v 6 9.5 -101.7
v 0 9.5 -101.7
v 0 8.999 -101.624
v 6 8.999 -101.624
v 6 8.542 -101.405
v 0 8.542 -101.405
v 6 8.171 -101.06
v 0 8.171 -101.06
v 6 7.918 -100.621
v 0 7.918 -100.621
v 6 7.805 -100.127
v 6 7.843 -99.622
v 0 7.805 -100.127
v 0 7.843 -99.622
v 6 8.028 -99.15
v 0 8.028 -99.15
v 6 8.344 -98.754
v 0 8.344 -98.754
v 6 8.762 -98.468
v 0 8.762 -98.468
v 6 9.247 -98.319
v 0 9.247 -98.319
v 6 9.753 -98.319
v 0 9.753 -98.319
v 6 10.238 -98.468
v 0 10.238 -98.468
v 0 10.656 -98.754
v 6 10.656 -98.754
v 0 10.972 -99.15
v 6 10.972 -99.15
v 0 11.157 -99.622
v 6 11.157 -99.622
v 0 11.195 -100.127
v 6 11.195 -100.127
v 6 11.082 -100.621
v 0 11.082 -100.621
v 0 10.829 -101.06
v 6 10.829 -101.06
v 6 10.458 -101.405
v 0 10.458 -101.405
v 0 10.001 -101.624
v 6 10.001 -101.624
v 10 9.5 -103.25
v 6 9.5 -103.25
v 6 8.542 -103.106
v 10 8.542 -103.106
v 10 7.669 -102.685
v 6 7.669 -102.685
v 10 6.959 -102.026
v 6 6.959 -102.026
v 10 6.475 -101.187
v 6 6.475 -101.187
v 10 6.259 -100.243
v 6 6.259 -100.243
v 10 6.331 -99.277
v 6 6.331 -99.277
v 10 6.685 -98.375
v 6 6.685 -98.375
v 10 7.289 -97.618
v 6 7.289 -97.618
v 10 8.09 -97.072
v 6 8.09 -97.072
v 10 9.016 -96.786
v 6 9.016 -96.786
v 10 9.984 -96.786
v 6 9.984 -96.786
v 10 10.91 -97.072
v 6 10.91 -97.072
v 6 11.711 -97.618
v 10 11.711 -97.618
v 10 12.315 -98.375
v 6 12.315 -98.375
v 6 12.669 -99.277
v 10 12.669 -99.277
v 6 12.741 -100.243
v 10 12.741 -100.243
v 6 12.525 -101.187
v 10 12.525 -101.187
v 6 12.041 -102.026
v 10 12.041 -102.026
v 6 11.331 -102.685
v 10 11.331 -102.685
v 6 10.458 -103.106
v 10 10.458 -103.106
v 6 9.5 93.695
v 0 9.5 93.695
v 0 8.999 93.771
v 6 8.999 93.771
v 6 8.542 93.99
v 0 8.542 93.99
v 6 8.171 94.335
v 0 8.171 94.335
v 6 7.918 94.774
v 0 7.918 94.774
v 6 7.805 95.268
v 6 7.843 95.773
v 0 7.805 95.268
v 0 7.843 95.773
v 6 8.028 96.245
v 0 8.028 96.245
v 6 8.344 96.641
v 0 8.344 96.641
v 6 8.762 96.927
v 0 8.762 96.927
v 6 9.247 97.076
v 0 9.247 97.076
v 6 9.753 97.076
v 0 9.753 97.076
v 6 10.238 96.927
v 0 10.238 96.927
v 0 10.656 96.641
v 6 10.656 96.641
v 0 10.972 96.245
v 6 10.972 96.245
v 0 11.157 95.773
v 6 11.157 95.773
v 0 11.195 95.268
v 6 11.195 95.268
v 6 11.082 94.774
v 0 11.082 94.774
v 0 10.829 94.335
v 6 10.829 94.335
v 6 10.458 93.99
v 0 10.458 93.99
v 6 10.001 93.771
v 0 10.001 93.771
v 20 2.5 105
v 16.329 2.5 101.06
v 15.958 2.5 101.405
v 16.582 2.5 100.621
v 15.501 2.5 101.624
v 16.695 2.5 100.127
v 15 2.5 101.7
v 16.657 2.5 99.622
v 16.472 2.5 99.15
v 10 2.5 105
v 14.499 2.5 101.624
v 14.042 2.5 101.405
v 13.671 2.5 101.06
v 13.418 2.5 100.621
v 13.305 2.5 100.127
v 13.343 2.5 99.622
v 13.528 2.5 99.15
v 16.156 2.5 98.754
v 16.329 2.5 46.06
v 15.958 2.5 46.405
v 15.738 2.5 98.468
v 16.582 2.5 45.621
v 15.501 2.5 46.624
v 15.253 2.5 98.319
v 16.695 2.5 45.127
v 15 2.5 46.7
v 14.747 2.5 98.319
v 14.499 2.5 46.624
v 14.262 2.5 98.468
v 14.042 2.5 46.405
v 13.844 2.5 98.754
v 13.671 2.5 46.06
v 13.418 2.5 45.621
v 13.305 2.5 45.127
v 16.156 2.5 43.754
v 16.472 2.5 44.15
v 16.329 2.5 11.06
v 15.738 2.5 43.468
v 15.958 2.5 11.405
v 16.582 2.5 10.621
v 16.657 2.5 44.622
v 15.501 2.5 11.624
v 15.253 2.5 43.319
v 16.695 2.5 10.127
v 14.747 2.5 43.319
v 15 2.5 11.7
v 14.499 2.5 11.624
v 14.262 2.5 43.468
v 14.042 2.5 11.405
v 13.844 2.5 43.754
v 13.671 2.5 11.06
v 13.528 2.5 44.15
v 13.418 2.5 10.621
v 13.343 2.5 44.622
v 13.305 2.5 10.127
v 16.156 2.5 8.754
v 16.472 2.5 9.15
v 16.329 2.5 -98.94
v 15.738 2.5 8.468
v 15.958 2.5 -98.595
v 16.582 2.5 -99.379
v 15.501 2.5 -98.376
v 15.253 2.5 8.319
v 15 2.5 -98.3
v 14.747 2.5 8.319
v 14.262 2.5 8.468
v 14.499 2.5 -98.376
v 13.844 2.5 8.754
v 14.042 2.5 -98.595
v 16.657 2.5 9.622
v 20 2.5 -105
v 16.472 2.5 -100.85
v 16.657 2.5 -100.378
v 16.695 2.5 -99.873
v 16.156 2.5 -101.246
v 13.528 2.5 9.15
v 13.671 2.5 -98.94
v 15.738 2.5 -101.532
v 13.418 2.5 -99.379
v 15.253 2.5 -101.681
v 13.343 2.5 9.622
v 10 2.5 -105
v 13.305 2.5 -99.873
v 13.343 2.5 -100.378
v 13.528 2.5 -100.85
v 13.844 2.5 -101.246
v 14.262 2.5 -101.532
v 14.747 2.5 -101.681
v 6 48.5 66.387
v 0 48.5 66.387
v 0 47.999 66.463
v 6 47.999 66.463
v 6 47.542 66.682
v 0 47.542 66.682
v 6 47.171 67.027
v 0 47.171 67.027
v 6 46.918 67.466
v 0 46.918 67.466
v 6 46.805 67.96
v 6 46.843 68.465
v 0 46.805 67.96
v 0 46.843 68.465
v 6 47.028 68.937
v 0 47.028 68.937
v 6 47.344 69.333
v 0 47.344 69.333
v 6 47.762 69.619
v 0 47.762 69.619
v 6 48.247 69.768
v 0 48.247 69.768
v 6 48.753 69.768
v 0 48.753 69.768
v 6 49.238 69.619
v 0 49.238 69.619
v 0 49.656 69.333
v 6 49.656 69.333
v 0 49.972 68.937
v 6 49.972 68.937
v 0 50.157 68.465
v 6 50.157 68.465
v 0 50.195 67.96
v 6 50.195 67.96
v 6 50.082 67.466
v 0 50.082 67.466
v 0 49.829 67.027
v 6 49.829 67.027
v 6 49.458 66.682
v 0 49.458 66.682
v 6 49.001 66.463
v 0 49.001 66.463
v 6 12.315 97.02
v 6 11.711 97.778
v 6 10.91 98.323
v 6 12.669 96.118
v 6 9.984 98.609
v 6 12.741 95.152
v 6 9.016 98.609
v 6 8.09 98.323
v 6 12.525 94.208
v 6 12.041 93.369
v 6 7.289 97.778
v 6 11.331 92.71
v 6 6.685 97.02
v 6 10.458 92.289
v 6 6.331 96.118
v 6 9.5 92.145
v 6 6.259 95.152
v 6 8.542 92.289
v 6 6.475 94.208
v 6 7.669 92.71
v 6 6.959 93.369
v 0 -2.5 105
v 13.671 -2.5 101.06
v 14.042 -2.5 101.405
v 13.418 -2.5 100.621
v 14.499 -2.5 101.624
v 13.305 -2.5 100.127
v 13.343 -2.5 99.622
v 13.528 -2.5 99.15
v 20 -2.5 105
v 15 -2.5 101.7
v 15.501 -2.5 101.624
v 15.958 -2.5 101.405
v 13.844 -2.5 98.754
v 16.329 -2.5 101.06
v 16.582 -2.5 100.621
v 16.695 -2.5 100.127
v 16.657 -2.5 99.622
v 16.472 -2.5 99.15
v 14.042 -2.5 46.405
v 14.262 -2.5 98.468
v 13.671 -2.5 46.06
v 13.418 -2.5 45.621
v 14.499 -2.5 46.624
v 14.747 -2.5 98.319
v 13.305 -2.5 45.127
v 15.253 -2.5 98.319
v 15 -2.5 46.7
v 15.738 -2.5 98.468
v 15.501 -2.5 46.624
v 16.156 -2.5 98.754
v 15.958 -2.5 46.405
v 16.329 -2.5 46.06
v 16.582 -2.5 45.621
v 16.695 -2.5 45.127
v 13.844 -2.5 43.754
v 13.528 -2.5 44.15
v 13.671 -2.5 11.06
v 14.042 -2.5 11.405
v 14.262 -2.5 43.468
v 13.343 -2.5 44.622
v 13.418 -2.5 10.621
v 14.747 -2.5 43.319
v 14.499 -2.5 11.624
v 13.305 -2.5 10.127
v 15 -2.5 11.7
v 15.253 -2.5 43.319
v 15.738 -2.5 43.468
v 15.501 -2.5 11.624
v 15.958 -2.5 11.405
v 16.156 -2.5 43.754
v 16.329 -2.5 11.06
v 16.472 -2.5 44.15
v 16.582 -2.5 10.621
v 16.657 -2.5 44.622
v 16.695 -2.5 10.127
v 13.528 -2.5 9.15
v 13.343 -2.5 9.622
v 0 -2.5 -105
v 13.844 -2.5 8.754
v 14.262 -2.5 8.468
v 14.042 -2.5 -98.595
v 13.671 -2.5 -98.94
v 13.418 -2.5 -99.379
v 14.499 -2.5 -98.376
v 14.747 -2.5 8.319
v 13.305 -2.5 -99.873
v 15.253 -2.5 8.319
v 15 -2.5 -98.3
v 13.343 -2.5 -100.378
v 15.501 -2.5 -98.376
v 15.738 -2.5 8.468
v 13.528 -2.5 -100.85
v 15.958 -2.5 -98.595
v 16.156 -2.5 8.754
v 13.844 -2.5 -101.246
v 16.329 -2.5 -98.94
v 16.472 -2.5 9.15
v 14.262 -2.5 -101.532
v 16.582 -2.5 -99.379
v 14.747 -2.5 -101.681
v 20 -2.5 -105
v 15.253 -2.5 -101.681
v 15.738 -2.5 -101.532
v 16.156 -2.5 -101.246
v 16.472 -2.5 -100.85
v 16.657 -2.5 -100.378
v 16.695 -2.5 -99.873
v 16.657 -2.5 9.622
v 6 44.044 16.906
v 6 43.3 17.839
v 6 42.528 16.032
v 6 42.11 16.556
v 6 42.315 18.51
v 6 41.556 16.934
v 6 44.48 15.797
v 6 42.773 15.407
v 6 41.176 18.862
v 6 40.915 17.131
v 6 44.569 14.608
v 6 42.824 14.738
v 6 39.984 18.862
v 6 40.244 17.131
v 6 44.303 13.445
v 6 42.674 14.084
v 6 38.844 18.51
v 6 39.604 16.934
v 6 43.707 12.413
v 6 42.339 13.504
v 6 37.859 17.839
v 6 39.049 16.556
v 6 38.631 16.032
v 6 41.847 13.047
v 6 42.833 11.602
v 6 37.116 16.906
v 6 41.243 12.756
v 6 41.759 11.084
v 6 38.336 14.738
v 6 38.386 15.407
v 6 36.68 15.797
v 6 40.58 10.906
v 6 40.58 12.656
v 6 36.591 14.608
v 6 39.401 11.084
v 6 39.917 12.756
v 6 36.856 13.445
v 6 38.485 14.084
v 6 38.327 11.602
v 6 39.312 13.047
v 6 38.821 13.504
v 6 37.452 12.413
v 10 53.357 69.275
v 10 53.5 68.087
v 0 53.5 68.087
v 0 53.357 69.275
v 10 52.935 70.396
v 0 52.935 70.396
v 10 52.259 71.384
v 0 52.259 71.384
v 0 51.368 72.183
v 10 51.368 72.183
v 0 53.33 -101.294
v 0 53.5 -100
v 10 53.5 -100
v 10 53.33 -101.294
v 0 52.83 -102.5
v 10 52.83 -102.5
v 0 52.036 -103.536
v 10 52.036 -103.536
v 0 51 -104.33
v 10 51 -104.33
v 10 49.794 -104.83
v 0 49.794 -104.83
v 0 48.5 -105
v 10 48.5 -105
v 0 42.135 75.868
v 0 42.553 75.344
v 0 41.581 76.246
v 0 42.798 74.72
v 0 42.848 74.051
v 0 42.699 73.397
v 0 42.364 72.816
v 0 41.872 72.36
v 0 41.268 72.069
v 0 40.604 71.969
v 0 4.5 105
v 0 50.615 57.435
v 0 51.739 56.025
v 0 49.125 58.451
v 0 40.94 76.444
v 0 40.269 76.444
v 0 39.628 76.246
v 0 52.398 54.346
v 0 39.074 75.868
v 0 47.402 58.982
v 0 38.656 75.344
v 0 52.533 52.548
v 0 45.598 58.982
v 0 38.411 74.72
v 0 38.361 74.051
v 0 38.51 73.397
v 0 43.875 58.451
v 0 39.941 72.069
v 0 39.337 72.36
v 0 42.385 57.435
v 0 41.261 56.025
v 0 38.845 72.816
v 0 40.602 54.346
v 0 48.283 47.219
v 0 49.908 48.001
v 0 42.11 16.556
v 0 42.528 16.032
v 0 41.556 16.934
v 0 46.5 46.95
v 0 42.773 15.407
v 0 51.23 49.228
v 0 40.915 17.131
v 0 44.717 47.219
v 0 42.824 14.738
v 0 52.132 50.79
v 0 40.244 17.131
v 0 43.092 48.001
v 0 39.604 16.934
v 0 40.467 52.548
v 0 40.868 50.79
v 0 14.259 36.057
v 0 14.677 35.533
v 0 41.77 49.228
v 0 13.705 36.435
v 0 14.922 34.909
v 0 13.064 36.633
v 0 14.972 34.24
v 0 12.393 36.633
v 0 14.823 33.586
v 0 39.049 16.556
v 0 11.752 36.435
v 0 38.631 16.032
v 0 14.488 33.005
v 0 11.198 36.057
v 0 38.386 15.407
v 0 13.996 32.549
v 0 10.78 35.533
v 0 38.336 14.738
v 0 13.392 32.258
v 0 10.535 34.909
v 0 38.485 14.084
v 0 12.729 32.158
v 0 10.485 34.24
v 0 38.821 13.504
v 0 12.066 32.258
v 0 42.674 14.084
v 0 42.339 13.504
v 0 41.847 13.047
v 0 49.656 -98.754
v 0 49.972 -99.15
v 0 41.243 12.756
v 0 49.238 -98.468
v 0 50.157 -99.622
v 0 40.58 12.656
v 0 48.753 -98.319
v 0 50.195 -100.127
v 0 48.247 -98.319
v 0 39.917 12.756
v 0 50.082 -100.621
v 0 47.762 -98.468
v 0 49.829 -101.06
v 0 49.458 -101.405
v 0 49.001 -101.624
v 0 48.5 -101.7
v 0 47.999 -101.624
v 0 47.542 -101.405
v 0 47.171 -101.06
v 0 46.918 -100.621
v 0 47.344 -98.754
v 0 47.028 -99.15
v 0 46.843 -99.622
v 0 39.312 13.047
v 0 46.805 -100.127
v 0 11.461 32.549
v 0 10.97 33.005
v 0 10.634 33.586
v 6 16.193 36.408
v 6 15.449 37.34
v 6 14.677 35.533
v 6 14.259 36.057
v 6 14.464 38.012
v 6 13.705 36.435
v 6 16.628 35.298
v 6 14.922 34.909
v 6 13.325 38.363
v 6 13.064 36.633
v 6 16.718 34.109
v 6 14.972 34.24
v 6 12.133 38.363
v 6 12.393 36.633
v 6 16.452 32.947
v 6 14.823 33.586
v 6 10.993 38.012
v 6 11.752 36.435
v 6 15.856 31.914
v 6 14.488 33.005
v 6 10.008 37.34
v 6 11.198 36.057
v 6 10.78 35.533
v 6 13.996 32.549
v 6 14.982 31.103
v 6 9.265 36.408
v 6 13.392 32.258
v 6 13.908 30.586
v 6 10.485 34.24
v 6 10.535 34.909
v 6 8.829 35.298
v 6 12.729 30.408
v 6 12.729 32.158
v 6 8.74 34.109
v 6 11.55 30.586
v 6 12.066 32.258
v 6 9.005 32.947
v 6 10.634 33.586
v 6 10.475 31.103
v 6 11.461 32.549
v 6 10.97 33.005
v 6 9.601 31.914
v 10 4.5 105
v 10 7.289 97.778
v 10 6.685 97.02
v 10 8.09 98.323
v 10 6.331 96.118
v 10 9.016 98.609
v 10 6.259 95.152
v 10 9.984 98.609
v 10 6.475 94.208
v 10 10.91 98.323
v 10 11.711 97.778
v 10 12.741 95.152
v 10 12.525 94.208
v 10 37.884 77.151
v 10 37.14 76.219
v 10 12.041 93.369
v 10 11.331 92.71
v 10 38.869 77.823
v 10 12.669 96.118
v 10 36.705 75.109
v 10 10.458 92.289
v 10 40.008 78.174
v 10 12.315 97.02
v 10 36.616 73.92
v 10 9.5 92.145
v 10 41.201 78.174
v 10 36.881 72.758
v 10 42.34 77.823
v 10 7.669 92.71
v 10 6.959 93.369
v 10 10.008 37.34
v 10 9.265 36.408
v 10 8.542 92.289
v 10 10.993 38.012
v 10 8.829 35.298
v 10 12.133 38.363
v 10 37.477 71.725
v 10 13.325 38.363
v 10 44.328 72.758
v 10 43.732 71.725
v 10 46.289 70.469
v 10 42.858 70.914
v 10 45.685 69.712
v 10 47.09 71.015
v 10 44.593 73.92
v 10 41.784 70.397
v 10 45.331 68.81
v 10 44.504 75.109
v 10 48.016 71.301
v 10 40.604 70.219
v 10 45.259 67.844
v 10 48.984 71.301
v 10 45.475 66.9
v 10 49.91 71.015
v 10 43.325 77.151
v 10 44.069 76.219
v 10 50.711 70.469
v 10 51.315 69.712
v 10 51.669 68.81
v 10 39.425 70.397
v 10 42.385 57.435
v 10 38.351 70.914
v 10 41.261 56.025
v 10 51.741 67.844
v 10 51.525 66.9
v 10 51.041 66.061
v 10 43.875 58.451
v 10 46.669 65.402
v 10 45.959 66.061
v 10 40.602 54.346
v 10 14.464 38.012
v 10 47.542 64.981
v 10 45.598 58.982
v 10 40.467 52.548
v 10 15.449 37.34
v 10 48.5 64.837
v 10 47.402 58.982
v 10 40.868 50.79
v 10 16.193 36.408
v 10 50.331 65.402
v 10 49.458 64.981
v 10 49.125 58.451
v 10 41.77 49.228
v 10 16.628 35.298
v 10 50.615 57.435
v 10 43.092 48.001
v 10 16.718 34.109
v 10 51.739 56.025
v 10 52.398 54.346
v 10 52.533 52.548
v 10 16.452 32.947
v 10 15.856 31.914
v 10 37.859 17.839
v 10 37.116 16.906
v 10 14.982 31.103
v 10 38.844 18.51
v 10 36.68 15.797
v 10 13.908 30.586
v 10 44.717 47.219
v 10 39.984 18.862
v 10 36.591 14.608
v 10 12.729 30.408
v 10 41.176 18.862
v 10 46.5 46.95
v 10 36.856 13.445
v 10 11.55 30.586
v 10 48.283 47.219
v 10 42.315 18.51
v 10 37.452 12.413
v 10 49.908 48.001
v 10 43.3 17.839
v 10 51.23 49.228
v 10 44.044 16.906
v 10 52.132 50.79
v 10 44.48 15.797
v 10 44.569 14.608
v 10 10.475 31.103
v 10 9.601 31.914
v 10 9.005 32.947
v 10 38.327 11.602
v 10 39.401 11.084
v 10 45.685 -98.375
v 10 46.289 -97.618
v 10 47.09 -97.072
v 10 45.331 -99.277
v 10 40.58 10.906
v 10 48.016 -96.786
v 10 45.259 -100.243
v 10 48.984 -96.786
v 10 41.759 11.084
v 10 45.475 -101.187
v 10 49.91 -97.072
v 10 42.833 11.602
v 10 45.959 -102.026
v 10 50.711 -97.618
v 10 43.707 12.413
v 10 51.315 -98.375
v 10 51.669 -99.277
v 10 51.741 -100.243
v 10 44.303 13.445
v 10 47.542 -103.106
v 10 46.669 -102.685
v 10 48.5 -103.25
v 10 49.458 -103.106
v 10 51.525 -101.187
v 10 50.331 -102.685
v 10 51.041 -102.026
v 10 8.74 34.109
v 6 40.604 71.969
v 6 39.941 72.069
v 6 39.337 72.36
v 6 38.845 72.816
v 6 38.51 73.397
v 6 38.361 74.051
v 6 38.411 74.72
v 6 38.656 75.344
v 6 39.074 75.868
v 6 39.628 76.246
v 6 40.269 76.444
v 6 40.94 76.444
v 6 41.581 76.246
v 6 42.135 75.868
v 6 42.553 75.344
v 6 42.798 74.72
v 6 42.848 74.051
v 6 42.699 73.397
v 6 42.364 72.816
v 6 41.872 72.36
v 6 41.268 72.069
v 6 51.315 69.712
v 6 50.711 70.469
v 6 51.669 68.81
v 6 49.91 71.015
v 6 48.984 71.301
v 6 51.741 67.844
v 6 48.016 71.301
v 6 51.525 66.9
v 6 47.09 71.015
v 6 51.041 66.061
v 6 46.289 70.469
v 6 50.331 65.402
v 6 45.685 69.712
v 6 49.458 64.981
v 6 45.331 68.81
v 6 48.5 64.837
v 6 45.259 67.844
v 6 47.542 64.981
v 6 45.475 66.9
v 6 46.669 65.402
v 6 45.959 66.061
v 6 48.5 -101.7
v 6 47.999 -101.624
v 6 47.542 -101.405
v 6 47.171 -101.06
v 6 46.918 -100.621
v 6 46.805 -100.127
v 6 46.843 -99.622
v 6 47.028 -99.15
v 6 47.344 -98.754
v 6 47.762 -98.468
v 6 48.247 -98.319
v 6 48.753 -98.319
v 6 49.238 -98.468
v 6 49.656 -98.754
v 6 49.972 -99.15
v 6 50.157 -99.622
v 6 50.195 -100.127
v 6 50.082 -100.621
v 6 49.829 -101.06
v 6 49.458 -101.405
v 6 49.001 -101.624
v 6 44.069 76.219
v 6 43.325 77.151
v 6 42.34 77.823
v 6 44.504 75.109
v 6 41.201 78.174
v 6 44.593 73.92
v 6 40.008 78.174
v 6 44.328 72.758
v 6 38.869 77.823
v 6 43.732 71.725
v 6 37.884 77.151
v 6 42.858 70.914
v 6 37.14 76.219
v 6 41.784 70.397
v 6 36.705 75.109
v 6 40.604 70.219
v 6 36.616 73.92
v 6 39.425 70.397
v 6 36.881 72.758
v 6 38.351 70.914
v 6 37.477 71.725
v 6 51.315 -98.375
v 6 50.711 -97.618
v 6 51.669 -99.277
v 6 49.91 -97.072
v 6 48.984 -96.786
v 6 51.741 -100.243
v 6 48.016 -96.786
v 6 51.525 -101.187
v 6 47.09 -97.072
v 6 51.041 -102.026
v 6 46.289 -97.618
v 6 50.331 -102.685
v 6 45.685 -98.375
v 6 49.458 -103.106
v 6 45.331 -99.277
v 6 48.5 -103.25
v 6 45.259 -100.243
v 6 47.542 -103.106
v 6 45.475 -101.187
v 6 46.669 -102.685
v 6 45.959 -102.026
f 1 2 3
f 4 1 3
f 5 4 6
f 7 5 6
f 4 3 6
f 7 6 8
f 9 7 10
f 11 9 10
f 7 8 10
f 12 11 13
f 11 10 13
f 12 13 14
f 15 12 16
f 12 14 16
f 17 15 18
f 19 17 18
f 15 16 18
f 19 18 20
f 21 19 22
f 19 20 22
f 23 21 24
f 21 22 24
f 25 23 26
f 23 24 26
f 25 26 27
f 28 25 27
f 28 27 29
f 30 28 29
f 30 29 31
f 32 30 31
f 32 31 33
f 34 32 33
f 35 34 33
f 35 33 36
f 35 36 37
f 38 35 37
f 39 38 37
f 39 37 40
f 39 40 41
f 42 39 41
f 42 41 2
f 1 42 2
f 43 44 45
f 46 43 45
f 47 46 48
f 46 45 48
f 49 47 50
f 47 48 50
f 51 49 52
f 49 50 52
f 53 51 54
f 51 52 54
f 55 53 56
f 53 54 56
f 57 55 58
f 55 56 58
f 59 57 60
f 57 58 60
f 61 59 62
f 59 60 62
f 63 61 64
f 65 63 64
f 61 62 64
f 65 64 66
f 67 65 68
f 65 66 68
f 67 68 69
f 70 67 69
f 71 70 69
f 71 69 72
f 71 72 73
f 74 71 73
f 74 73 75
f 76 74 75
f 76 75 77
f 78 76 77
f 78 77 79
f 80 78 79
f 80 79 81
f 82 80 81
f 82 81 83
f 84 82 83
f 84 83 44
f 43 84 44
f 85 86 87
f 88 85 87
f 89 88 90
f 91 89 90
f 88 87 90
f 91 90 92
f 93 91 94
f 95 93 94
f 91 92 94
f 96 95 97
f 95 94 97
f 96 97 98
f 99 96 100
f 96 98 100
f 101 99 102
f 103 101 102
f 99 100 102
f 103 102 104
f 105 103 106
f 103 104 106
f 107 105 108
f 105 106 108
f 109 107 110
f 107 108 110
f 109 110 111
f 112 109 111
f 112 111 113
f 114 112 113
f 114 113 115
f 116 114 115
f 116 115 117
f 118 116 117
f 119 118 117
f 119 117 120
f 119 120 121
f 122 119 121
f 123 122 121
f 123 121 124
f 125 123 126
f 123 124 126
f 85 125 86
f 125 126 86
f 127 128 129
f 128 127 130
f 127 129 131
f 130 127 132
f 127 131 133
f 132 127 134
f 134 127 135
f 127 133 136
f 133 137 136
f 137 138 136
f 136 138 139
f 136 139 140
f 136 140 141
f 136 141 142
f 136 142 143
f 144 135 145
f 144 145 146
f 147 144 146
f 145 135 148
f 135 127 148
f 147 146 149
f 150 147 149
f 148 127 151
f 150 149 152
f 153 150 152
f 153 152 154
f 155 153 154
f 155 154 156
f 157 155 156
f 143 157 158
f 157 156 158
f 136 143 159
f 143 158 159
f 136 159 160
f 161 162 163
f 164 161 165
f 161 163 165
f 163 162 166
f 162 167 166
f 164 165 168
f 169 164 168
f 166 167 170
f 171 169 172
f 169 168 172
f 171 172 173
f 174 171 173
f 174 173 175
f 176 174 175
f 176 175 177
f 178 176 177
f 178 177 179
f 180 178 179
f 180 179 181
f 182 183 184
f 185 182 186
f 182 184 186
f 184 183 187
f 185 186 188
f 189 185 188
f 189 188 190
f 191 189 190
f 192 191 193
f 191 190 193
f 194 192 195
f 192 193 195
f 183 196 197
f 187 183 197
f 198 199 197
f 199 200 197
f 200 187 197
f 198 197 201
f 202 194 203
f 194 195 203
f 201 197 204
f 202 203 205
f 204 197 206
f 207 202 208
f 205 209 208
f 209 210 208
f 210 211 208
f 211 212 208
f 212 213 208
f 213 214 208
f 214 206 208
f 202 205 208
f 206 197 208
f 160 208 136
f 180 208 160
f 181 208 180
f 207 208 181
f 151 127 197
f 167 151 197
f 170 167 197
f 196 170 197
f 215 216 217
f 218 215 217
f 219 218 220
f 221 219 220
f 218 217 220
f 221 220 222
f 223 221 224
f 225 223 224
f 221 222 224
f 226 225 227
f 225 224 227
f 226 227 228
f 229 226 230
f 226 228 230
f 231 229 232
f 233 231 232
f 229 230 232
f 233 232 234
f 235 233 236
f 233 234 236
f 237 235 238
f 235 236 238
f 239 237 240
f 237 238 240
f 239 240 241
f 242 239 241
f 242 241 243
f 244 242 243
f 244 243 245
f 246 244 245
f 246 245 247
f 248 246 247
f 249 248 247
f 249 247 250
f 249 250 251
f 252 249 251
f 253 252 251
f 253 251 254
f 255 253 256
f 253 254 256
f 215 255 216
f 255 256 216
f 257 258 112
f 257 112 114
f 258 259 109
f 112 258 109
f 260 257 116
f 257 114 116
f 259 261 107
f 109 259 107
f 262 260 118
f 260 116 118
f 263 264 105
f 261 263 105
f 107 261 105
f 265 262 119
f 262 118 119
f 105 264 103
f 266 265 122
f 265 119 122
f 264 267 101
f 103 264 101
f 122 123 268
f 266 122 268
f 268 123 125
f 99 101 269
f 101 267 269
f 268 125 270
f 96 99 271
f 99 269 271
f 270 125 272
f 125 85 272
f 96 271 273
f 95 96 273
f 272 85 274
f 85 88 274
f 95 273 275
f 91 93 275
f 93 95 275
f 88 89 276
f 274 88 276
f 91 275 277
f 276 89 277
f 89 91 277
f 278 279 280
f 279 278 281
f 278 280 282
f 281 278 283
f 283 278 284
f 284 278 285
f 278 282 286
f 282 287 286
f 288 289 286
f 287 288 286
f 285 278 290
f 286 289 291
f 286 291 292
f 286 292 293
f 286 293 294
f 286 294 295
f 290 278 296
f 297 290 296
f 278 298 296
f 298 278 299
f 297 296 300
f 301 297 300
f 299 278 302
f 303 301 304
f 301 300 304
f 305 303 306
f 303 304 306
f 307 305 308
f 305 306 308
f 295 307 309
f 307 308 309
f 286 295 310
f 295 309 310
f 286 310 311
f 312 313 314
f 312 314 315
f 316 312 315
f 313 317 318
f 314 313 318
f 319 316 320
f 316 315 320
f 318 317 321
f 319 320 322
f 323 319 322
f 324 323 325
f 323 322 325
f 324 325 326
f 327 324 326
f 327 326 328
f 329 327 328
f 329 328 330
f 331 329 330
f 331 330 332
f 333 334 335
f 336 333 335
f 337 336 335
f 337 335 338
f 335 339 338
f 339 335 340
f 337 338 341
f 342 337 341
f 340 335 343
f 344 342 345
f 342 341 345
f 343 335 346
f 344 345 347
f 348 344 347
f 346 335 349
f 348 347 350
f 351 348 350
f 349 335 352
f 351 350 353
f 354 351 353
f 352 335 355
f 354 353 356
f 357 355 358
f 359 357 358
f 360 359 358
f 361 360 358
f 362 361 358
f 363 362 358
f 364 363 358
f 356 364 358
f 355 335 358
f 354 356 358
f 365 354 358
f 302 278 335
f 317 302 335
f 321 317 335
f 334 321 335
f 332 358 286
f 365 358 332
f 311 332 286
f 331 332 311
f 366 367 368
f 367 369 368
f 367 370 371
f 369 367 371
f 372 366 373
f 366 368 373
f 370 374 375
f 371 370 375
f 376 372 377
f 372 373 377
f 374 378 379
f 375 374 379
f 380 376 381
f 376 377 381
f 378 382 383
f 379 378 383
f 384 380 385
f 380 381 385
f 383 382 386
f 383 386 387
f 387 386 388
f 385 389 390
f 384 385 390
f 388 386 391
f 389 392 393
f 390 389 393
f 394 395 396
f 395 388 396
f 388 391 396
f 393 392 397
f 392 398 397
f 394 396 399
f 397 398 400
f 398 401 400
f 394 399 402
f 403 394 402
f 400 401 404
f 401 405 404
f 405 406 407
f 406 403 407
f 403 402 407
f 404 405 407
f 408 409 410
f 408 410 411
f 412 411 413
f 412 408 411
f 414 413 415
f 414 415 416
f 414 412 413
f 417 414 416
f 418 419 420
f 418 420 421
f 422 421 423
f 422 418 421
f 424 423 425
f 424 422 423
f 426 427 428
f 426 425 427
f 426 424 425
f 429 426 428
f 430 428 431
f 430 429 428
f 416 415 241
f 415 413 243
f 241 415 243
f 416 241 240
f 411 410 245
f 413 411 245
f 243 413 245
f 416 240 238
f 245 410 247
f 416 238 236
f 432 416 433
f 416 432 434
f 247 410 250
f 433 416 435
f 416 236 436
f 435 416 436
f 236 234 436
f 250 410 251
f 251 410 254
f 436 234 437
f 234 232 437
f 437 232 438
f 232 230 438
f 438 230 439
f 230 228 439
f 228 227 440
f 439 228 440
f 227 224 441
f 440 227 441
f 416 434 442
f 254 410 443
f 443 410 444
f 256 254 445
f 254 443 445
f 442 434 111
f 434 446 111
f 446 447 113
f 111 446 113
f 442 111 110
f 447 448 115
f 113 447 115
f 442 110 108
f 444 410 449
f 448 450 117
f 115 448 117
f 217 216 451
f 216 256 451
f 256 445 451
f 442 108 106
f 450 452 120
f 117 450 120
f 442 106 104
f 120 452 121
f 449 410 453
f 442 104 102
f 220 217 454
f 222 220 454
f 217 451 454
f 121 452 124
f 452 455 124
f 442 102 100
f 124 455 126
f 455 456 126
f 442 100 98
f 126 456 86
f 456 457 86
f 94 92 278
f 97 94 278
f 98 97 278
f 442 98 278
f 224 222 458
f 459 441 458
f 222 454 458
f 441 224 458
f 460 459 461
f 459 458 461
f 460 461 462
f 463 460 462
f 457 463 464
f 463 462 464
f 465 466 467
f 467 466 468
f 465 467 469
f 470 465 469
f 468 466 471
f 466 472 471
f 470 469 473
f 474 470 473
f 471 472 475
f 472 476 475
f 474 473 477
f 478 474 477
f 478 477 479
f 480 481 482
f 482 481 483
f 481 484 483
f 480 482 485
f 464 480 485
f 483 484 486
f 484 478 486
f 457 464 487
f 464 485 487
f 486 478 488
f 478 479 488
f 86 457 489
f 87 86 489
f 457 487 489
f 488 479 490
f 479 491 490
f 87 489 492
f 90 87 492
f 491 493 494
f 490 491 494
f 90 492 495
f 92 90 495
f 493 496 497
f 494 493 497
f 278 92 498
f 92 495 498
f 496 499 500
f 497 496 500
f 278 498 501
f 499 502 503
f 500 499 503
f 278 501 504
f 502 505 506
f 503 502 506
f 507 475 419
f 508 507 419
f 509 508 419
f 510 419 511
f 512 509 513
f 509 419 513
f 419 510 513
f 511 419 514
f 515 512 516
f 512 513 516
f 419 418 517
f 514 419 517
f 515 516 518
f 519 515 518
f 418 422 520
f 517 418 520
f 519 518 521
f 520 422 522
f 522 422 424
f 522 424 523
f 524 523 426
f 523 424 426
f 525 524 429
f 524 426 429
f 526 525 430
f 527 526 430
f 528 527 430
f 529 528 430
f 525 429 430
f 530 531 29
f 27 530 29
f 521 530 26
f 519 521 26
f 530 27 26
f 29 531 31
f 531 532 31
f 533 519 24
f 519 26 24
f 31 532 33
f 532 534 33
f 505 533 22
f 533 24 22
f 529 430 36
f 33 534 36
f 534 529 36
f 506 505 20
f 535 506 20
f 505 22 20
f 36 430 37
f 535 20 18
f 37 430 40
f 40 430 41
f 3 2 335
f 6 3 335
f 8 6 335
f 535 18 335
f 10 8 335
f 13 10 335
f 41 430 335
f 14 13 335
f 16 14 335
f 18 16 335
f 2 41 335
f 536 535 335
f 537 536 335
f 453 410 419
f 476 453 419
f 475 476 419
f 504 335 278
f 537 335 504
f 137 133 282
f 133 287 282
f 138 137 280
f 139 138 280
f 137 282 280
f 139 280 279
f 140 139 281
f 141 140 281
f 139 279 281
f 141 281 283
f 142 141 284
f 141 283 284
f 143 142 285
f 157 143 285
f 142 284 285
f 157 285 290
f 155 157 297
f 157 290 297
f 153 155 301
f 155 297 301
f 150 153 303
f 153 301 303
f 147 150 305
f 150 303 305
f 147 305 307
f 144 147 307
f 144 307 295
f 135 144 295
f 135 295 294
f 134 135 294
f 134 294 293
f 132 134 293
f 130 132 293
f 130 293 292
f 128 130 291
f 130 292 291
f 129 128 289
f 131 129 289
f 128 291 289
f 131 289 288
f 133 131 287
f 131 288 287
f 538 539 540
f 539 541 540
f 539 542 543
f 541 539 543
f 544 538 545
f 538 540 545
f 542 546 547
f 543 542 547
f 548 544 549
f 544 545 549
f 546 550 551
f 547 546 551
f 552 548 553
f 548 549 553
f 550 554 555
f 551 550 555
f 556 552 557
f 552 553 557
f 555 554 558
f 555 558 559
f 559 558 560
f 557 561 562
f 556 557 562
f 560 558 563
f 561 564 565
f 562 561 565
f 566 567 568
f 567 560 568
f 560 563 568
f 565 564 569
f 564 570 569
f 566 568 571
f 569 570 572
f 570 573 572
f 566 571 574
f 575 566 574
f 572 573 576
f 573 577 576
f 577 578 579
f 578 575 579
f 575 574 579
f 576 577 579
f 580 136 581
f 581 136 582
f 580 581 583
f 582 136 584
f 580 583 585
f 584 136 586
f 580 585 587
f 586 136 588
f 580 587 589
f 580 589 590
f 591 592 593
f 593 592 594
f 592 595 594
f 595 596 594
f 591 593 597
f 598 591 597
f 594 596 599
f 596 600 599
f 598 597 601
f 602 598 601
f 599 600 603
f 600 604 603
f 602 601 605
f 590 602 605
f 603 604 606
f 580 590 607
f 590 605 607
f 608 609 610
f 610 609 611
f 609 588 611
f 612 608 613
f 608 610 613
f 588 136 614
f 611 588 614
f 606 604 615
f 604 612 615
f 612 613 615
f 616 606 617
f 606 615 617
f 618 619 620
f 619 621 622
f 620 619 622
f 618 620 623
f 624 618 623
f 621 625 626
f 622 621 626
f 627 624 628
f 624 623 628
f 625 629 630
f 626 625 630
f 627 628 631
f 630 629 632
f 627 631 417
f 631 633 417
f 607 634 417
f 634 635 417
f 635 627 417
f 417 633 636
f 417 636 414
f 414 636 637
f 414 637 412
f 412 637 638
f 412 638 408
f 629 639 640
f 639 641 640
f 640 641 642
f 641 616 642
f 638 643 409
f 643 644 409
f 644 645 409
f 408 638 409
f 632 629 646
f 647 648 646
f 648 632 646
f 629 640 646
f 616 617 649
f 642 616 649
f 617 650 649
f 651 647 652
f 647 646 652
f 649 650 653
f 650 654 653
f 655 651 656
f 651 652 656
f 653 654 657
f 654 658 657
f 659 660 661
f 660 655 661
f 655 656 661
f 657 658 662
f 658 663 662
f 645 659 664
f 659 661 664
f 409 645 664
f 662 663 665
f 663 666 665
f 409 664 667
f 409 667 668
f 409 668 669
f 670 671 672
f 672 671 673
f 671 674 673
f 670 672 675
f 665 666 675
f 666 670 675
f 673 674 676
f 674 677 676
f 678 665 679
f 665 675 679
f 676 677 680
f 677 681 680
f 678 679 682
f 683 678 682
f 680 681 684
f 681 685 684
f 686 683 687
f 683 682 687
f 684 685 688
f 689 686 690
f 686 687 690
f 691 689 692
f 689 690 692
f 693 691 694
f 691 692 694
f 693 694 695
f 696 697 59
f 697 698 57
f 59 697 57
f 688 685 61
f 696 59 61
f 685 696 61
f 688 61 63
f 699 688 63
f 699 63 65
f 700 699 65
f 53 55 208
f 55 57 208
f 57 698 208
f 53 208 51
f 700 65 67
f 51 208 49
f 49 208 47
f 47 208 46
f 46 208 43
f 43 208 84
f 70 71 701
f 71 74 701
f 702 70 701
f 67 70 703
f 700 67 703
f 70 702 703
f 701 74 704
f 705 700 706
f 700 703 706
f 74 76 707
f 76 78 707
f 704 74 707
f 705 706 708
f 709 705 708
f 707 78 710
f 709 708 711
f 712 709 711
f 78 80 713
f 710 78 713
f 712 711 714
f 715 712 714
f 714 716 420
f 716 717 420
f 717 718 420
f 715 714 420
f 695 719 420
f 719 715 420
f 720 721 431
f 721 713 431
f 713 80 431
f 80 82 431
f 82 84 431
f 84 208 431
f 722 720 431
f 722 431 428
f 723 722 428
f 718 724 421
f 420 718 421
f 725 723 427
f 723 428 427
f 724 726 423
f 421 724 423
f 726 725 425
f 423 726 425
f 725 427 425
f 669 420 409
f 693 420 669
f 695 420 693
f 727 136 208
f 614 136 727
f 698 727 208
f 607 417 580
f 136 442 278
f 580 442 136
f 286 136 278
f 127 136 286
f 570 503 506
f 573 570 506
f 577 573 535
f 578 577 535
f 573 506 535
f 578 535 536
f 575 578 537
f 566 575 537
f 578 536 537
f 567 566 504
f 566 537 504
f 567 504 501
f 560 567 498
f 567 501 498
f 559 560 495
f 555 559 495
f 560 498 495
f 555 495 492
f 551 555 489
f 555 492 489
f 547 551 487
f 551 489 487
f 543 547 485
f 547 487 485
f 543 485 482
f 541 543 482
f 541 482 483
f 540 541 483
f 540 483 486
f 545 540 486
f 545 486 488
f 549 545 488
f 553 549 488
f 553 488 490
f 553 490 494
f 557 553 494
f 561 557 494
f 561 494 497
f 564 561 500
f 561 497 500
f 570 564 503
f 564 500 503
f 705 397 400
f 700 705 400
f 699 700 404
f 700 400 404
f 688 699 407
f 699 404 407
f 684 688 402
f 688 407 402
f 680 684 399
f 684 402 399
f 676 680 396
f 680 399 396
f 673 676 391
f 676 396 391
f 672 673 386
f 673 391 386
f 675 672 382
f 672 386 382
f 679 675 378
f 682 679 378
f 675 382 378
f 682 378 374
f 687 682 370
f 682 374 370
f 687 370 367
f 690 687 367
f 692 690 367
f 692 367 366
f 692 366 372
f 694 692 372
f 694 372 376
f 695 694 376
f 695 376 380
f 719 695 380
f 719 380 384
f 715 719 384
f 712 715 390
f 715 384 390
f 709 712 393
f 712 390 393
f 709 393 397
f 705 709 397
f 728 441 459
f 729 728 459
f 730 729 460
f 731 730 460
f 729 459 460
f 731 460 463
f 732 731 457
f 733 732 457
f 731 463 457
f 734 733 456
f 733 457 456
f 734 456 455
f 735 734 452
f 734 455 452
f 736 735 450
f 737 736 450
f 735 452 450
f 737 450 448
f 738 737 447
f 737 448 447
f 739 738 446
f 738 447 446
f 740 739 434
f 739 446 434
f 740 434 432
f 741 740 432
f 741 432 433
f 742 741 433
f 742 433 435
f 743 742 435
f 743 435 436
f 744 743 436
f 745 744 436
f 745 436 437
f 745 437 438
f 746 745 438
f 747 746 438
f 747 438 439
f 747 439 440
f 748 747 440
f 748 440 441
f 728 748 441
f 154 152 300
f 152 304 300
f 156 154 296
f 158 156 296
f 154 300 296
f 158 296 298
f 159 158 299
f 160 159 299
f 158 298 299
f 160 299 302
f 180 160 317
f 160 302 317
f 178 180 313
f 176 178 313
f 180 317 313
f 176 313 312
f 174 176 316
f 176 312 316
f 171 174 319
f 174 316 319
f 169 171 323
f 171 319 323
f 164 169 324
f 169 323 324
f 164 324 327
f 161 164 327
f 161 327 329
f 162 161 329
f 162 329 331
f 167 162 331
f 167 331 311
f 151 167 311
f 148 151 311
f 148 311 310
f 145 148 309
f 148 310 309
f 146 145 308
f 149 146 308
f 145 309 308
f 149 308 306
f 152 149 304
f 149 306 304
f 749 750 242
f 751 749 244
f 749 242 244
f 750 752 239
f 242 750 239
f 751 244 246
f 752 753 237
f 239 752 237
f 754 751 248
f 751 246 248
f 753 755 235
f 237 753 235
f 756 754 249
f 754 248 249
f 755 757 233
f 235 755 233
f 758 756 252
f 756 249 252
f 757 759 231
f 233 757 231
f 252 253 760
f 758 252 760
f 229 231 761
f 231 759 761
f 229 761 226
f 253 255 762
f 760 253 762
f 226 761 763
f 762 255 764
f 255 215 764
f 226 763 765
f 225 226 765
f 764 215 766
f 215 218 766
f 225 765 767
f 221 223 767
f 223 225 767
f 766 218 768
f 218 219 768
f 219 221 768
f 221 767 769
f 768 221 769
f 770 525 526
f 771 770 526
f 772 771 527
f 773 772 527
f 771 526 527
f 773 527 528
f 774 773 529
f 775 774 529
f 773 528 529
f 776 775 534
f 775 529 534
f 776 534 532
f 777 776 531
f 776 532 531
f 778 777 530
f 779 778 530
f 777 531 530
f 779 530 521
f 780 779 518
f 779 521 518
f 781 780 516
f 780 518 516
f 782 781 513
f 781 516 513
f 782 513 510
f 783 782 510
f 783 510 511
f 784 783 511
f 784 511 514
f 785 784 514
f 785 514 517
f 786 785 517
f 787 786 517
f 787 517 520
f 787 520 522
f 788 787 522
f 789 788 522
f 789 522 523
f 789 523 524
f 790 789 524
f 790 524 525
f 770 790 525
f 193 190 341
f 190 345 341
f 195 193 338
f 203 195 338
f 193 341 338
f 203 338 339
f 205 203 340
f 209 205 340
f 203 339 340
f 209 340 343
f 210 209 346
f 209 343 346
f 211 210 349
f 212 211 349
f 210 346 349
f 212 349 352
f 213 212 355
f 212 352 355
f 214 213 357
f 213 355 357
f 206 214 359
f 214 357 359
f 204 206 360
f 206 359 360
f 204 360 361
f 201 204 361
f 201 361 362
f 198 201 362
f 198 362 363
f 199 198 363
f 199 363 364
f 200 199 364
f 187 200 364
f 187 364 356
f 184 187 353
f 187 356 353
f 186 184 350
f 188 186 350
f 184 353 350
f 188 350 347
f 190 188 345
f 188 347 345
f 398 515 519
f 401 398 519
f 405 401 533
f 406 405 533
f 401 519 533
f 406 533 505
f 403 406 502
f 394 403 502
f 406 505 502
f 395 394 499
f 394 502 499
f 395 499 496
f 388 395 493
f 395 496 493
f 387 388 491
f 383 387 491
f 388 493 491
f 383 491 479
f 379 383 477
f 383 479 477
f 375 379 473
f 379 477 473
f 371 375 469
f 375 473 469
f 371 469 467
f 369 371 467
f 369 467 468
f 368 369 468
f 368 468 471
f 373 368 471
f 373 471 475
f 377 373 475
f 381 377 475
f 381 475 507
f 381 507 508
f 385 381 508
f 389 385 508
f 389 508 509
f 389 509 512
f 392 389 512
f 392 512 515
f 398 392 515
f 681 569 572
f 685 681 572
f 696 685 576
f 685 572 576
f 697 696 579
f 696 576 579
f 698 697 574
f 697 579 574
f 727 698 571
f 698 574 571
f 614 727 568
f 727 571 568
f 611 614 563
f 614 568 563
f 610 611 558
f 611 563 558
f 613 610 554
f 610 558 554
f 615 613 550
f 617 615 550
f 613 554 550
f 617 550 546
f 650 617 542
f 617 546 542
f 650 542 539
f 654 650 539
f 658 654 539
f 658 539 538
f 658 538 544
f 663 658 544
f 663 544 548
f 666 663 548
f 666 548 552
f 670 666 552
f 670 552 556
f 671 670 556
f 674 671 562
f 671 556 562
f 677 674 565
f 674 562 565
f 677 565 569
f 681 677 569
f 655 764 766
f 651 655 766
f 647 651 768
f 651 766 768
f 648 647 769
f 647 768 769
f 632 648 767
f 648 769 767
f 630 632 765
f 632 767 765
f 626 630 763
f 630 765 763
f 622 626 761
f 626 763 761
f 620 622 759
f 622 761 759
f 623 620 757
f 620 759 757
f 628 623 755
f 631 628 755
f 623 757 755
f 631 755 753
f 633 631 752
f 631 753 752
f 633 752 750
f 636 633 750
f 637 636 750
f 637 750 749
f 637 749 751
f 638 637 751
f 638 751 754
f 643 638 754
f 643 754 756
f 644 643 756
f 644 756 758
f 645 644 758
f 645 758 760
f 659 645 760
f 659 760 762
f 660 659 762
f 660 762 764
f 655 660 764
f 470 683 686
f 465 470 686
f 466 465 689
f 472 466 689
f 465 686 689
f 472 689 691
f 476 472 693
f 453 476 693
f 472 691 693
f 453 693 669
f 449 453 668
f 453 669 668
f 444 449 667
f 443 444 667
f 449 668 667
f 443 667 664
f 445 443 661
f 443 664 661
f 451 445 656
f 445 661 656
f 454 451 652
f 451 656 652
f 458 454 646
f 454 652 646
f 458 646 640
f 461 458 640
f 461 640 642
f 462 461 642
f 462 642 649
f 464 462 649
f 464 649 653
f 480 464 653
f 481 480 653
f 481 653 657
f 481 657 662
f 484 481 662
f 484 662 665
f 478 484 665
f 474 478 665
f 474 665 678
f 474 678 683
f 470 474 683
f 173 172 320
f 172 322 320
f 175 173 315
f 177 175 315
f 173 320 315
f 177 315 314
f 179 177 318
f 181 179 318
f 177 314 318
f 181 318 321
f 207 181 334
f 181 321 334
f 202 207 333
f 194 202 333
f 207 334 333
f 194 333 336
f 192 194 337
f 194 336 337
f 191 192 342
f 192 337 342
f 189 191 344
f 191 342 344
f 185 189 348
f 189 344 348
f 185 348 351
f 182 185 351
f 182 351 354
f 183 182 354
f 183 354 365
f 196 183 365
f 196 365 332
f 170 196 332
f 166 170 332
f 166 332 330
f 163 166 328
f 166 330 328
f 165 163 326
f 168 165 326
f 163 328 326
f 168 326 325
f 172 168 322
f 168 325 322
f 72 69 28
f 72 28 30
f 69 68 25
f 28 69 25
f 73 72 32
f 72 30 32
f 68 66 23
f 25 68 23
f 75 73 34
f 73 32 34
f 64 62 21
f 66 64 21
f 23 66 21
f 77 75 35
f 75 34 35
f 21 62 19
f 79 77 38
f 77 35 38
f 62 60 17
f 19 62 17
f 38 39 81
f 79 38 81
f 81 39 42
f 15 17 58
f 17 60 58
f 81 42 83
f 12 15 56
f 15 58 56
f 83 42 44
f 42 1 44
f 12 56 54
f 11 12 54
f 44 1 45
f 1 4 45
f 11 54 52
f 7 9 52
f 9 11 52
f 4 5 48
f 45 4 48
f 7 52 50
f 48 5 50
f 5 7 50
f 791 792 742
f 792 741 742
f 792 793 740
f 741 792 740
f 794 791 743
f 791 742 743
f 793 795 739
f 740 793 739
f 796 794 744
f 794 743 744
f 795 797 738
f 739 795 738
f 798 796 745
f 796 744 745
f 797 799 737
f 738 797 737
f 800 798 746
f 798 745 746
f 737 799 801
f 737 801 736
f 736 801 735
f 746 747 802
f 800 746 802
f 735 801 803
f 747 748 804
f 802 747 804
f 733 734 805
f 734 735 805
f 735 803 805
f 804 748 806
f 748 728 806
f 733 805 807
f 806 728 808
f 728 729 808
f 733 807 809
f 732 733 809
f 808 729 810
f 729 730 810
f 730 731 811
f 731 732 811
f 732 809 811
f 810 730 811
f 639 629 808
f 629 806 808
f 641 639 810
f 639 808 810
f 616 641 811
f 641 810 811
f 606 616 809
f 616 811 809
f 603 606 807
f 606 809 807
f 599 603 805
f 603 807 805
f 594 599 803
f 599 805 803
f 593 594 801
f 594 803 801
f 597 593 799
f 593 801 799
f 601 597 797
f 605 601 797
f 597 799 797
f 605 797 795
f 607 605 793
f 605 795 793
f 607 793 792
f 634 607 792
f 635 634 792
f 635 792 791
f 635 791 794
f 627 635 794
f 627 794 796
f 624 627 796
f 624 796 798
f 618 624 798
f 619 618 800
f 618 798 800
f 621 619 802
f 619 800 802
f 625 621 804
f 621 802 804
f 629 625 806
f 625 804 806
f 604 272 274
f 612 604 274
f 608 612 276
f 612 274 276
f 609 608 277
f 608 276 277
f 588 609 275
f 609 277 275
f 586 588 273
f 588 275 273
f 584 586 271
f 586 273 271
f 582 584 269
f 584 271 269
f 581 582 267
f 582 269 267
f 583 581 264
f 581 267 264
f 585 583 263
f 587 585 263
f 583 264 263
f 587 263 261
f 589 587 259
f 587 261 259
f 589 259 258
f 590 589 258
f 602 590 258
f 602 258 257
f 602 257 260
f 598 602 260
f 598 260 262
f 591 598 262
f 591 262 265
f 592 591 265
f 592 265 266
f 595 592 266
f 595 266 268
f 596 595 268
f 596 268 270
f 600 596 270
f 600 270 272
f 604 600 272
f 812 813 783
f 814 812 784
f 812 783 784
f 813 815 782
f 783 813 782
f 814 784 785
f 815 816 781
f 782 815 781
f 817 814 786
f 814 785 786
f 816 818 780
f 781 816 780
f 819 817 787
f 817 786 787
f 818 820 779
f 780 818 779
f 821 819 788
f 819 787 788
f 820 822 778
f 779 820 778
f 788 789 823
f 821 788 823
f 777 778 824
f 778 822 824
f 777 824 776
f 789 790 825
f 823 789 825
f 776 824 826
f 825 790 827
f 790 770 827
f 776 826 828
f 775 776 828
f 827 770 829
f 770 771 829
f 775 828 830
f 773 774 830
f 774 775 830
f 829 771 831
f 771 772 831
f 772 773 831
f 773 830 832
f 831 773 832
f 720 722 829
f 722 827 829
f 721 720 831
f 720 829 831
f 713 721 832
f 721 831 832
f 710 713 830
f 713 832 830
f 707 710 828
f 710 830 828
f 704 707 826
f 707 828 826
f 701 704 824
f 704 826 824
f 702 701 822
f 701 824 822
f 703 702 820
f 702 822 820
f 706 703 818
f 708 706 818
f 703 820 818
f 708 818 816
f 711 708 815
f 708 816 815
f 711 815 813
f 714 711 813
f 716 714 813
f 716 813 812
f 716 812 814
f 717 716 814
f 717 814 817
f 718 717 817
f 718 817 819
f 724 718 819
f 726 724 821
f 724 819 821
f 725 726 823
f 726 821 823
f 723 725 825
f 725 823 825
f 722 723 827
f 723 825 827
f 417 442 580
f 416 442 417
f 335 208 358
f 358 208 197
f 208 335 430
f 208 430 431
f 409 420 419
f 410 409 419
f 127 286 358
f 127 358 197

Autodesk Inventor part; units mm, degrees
ref_plane "YZ Plane" through (0, 0, 0) normal (1, 0, 0) x (0, 1, 0)
ref_plane "XZ Plane" through (0, 0, 0) normal (0, 1, 0) x (-1, 0, 0)
ref_plane "XY Plane" through (0, 0, 0) normal (0, 0, 1) x (1, 0, 0)
sketch "スケッチ1" plane through (0, 0, 0) normal (0, 0, 1) x (1, 0, 0)
  line L0 (-20, -2.5) -> (20, -2.5)
  line L1 (20, -2.5) -> (20, 2.5)
  line L2 (-20, 2.5) -> (-20, -2.5)
  line L3 (-20, -2.5) -> (20, 2.5) construction
  line L4 (20, -2.5) -> (-20, 2.5) construction
  line L5 (-10, 2.5) -> (10, 2.5)
  line L6 (10, 2.5) -> (10, 53.5)
  line L7 (10, 53.5) -> (-10, 53.5)
  line L8 (-10, 53.5) -> (-10, 2.5)
  line L9 (-10, 2.5) -> (10, 53.5) construction
  line L10 (10, 2.5) -> (-10, 53.5) construction
  line L11 (20, 2.5) -> (10, 2.5)
  line L12 (-10, 2.5) -> (-20, 2.5)
  line L13 (0, 53.5) -> (0, -2.5)
  point P0 (0, 0)
  point P1 (0, 28)
  point P2 (0, 28)
  point P3 (0, 0)
  dimension "d0" = 20
  dimension "d1" = 51
  dimension "d2" = 5
  dimension "d3" = 10
extrude "押し出し1" add sketch "スケッチ1" along normal mid plane 210 contours L13 L5 L11 L1 L0 | L13 L7 L6 L5
sketch "スケッチ4" plane through (0, -2.5, 105) normal (-1, 0, 0) x (0, 0, 1)
  line L0 (0, 7) -> (-34.3102, 56)
  line L1 (-210, 56) -> (0, 56) projected
  line L2 (0, 56) -> (0, 0) projected
  line L3 (0, 5) -> (-210, 5) projected
  point P0 (-105, 2.5)
  dimension "d18" = 35
  dimension "d21" = 2
extrude "押し出し3" cut sketch "スケッチ4" against normal through all
sketch "スケッチ5" plane through (10, 2.5, -105) normal (1, 0, 0) x (0, 0, -1)
  circle A0 centre (-158, 44) radius 6.05
  line L0 (0, 0) -> (-210, 0) projected
  line L1 (-210, 0) -> (-210, 2) projected
  point P0 (-105, -2.5)
  dimension "d22" = 12.1
  dimension "d23" = 44
  dimension "d37" = 52
extrude "押し出し4" cut sketch "スケッチ5" against normal blind 10
sketch "スケッチ6" plane through (10, 2.5, 105) normal (0, 1, 0) x (1, 0, 0)
  line L0 (10, 210) -> (10, 0) projected
  line L1 (10, 0) -> (0, 0) projected
  line L2 (0, 210) -> (10, 210) projected
  point P0 (-10, 105)
  point P1 (5, 205)
  point P2 (5, 5)
  point P3 (5, 60)
  point P4 (5, 95)
  dimension "d27" = 5
  dimension "d28" = 5
  dimension "d29" = 5
  dimension "d50" = 35
  dimension "d51" = 55
hole "穴2" at (15, 2.5, -100) at (15, 2.5, 100) at (15, 2.5, 45) at (15, 2.5, 10) direction (0, -1, 0) diameter 3.4 end through all clearance for "Socket Head Cap Screw" size "M3" standard "Ansi Metric M Profile"
sketch "スケッチ9" plane through (10, -2.5, -105) normal (-1, 0, 0) x (0, 0, 1)
  circle A0 centre (158, 49) radius 6.05 projected
  line L0 (139.4081, 15.2287) -> (179.2189, 43.1045)
  line L1 (179.2189, 43.1045) -> (159.7173, 70.9557)
  line L2 (159.7173, 70.9557) -> (119.9065, 43.0798)
  line L3 (119.9065, 43.0798) -> (139.4081, 15.2287)
  line L4 (139.4081, 15.2287) -> (159.7173, 70.9557) construction
  line L5 (179.2189, 43.1045) -> (119.9065, 43.0798) construction
  line L6 (210, 7) -> (175.6898, 56) projected
  line L7 (158, 49) -> (149.5627, 43.0922) construction
  point P0 (157.2238, 55)
  point P1 (158.7762, 55)
  dimension "d123" = 48.6
  dimension "d124" = 34
  dimension "d125" = 14
hole "穴6" at (10, 40.5798, 14.9065) at (10, 12.7287, 34.4081) at (10, 40.6045, 74.2189) direction (-1, 0, 0) diameter 4.5 end through all counterbore diameter 8 counterbore depth 4 clearance for "Socket Head Cap Screw" size "M4" standard "Ansi Metric M Profile"
sketch "スケッチ14" plane through (10, 2.5, -105) normal (1, 0, 0) x (0, 0, -1)
  line L0 (0, 51) -> (0, 0) projected
  line L1 (0, 51) -> (-175.6898, 51) projected
  line L2 (0, 0) -> (-210, 0) projected
  line L3 (-175.6898, 51) -> (-210, 2) projected
  point P0 (-105, -2.5)
  point P1 (-173.087, 46)
  point P2 (-200.3951, 7)
  point P3 (-5, 46)
  point P4 (-5, 7)
  dimension "d126" = 5
  dimension "d127" = 5
  dimension "d128" = 7
  dimension "d129" = 5
  dimension "d130" = 5
hole "穴9" at (10, 48.5, 68.087) at (10, 9.5, 95.3951) at (10, 48.5, -100) at (10, 9.5, -100) direction (-1, 0, 0) diameter 3.4 end through all counterbore diameter 6.5 counterbore depth 4 clearance for "Socket Head Cap Screw" size "M3" standard "Ansi Metric M Profile"
fillet "フィレット1" radius 5 2 edges at (5, 53.5, -105) (5, 53.5, 70.6898)
equation "\"d127\" = d126"
equation "\"d129\" = d127"
equation "\"d130\" = d126"
properties part number "s_base4" material "ABS プラスチック"
